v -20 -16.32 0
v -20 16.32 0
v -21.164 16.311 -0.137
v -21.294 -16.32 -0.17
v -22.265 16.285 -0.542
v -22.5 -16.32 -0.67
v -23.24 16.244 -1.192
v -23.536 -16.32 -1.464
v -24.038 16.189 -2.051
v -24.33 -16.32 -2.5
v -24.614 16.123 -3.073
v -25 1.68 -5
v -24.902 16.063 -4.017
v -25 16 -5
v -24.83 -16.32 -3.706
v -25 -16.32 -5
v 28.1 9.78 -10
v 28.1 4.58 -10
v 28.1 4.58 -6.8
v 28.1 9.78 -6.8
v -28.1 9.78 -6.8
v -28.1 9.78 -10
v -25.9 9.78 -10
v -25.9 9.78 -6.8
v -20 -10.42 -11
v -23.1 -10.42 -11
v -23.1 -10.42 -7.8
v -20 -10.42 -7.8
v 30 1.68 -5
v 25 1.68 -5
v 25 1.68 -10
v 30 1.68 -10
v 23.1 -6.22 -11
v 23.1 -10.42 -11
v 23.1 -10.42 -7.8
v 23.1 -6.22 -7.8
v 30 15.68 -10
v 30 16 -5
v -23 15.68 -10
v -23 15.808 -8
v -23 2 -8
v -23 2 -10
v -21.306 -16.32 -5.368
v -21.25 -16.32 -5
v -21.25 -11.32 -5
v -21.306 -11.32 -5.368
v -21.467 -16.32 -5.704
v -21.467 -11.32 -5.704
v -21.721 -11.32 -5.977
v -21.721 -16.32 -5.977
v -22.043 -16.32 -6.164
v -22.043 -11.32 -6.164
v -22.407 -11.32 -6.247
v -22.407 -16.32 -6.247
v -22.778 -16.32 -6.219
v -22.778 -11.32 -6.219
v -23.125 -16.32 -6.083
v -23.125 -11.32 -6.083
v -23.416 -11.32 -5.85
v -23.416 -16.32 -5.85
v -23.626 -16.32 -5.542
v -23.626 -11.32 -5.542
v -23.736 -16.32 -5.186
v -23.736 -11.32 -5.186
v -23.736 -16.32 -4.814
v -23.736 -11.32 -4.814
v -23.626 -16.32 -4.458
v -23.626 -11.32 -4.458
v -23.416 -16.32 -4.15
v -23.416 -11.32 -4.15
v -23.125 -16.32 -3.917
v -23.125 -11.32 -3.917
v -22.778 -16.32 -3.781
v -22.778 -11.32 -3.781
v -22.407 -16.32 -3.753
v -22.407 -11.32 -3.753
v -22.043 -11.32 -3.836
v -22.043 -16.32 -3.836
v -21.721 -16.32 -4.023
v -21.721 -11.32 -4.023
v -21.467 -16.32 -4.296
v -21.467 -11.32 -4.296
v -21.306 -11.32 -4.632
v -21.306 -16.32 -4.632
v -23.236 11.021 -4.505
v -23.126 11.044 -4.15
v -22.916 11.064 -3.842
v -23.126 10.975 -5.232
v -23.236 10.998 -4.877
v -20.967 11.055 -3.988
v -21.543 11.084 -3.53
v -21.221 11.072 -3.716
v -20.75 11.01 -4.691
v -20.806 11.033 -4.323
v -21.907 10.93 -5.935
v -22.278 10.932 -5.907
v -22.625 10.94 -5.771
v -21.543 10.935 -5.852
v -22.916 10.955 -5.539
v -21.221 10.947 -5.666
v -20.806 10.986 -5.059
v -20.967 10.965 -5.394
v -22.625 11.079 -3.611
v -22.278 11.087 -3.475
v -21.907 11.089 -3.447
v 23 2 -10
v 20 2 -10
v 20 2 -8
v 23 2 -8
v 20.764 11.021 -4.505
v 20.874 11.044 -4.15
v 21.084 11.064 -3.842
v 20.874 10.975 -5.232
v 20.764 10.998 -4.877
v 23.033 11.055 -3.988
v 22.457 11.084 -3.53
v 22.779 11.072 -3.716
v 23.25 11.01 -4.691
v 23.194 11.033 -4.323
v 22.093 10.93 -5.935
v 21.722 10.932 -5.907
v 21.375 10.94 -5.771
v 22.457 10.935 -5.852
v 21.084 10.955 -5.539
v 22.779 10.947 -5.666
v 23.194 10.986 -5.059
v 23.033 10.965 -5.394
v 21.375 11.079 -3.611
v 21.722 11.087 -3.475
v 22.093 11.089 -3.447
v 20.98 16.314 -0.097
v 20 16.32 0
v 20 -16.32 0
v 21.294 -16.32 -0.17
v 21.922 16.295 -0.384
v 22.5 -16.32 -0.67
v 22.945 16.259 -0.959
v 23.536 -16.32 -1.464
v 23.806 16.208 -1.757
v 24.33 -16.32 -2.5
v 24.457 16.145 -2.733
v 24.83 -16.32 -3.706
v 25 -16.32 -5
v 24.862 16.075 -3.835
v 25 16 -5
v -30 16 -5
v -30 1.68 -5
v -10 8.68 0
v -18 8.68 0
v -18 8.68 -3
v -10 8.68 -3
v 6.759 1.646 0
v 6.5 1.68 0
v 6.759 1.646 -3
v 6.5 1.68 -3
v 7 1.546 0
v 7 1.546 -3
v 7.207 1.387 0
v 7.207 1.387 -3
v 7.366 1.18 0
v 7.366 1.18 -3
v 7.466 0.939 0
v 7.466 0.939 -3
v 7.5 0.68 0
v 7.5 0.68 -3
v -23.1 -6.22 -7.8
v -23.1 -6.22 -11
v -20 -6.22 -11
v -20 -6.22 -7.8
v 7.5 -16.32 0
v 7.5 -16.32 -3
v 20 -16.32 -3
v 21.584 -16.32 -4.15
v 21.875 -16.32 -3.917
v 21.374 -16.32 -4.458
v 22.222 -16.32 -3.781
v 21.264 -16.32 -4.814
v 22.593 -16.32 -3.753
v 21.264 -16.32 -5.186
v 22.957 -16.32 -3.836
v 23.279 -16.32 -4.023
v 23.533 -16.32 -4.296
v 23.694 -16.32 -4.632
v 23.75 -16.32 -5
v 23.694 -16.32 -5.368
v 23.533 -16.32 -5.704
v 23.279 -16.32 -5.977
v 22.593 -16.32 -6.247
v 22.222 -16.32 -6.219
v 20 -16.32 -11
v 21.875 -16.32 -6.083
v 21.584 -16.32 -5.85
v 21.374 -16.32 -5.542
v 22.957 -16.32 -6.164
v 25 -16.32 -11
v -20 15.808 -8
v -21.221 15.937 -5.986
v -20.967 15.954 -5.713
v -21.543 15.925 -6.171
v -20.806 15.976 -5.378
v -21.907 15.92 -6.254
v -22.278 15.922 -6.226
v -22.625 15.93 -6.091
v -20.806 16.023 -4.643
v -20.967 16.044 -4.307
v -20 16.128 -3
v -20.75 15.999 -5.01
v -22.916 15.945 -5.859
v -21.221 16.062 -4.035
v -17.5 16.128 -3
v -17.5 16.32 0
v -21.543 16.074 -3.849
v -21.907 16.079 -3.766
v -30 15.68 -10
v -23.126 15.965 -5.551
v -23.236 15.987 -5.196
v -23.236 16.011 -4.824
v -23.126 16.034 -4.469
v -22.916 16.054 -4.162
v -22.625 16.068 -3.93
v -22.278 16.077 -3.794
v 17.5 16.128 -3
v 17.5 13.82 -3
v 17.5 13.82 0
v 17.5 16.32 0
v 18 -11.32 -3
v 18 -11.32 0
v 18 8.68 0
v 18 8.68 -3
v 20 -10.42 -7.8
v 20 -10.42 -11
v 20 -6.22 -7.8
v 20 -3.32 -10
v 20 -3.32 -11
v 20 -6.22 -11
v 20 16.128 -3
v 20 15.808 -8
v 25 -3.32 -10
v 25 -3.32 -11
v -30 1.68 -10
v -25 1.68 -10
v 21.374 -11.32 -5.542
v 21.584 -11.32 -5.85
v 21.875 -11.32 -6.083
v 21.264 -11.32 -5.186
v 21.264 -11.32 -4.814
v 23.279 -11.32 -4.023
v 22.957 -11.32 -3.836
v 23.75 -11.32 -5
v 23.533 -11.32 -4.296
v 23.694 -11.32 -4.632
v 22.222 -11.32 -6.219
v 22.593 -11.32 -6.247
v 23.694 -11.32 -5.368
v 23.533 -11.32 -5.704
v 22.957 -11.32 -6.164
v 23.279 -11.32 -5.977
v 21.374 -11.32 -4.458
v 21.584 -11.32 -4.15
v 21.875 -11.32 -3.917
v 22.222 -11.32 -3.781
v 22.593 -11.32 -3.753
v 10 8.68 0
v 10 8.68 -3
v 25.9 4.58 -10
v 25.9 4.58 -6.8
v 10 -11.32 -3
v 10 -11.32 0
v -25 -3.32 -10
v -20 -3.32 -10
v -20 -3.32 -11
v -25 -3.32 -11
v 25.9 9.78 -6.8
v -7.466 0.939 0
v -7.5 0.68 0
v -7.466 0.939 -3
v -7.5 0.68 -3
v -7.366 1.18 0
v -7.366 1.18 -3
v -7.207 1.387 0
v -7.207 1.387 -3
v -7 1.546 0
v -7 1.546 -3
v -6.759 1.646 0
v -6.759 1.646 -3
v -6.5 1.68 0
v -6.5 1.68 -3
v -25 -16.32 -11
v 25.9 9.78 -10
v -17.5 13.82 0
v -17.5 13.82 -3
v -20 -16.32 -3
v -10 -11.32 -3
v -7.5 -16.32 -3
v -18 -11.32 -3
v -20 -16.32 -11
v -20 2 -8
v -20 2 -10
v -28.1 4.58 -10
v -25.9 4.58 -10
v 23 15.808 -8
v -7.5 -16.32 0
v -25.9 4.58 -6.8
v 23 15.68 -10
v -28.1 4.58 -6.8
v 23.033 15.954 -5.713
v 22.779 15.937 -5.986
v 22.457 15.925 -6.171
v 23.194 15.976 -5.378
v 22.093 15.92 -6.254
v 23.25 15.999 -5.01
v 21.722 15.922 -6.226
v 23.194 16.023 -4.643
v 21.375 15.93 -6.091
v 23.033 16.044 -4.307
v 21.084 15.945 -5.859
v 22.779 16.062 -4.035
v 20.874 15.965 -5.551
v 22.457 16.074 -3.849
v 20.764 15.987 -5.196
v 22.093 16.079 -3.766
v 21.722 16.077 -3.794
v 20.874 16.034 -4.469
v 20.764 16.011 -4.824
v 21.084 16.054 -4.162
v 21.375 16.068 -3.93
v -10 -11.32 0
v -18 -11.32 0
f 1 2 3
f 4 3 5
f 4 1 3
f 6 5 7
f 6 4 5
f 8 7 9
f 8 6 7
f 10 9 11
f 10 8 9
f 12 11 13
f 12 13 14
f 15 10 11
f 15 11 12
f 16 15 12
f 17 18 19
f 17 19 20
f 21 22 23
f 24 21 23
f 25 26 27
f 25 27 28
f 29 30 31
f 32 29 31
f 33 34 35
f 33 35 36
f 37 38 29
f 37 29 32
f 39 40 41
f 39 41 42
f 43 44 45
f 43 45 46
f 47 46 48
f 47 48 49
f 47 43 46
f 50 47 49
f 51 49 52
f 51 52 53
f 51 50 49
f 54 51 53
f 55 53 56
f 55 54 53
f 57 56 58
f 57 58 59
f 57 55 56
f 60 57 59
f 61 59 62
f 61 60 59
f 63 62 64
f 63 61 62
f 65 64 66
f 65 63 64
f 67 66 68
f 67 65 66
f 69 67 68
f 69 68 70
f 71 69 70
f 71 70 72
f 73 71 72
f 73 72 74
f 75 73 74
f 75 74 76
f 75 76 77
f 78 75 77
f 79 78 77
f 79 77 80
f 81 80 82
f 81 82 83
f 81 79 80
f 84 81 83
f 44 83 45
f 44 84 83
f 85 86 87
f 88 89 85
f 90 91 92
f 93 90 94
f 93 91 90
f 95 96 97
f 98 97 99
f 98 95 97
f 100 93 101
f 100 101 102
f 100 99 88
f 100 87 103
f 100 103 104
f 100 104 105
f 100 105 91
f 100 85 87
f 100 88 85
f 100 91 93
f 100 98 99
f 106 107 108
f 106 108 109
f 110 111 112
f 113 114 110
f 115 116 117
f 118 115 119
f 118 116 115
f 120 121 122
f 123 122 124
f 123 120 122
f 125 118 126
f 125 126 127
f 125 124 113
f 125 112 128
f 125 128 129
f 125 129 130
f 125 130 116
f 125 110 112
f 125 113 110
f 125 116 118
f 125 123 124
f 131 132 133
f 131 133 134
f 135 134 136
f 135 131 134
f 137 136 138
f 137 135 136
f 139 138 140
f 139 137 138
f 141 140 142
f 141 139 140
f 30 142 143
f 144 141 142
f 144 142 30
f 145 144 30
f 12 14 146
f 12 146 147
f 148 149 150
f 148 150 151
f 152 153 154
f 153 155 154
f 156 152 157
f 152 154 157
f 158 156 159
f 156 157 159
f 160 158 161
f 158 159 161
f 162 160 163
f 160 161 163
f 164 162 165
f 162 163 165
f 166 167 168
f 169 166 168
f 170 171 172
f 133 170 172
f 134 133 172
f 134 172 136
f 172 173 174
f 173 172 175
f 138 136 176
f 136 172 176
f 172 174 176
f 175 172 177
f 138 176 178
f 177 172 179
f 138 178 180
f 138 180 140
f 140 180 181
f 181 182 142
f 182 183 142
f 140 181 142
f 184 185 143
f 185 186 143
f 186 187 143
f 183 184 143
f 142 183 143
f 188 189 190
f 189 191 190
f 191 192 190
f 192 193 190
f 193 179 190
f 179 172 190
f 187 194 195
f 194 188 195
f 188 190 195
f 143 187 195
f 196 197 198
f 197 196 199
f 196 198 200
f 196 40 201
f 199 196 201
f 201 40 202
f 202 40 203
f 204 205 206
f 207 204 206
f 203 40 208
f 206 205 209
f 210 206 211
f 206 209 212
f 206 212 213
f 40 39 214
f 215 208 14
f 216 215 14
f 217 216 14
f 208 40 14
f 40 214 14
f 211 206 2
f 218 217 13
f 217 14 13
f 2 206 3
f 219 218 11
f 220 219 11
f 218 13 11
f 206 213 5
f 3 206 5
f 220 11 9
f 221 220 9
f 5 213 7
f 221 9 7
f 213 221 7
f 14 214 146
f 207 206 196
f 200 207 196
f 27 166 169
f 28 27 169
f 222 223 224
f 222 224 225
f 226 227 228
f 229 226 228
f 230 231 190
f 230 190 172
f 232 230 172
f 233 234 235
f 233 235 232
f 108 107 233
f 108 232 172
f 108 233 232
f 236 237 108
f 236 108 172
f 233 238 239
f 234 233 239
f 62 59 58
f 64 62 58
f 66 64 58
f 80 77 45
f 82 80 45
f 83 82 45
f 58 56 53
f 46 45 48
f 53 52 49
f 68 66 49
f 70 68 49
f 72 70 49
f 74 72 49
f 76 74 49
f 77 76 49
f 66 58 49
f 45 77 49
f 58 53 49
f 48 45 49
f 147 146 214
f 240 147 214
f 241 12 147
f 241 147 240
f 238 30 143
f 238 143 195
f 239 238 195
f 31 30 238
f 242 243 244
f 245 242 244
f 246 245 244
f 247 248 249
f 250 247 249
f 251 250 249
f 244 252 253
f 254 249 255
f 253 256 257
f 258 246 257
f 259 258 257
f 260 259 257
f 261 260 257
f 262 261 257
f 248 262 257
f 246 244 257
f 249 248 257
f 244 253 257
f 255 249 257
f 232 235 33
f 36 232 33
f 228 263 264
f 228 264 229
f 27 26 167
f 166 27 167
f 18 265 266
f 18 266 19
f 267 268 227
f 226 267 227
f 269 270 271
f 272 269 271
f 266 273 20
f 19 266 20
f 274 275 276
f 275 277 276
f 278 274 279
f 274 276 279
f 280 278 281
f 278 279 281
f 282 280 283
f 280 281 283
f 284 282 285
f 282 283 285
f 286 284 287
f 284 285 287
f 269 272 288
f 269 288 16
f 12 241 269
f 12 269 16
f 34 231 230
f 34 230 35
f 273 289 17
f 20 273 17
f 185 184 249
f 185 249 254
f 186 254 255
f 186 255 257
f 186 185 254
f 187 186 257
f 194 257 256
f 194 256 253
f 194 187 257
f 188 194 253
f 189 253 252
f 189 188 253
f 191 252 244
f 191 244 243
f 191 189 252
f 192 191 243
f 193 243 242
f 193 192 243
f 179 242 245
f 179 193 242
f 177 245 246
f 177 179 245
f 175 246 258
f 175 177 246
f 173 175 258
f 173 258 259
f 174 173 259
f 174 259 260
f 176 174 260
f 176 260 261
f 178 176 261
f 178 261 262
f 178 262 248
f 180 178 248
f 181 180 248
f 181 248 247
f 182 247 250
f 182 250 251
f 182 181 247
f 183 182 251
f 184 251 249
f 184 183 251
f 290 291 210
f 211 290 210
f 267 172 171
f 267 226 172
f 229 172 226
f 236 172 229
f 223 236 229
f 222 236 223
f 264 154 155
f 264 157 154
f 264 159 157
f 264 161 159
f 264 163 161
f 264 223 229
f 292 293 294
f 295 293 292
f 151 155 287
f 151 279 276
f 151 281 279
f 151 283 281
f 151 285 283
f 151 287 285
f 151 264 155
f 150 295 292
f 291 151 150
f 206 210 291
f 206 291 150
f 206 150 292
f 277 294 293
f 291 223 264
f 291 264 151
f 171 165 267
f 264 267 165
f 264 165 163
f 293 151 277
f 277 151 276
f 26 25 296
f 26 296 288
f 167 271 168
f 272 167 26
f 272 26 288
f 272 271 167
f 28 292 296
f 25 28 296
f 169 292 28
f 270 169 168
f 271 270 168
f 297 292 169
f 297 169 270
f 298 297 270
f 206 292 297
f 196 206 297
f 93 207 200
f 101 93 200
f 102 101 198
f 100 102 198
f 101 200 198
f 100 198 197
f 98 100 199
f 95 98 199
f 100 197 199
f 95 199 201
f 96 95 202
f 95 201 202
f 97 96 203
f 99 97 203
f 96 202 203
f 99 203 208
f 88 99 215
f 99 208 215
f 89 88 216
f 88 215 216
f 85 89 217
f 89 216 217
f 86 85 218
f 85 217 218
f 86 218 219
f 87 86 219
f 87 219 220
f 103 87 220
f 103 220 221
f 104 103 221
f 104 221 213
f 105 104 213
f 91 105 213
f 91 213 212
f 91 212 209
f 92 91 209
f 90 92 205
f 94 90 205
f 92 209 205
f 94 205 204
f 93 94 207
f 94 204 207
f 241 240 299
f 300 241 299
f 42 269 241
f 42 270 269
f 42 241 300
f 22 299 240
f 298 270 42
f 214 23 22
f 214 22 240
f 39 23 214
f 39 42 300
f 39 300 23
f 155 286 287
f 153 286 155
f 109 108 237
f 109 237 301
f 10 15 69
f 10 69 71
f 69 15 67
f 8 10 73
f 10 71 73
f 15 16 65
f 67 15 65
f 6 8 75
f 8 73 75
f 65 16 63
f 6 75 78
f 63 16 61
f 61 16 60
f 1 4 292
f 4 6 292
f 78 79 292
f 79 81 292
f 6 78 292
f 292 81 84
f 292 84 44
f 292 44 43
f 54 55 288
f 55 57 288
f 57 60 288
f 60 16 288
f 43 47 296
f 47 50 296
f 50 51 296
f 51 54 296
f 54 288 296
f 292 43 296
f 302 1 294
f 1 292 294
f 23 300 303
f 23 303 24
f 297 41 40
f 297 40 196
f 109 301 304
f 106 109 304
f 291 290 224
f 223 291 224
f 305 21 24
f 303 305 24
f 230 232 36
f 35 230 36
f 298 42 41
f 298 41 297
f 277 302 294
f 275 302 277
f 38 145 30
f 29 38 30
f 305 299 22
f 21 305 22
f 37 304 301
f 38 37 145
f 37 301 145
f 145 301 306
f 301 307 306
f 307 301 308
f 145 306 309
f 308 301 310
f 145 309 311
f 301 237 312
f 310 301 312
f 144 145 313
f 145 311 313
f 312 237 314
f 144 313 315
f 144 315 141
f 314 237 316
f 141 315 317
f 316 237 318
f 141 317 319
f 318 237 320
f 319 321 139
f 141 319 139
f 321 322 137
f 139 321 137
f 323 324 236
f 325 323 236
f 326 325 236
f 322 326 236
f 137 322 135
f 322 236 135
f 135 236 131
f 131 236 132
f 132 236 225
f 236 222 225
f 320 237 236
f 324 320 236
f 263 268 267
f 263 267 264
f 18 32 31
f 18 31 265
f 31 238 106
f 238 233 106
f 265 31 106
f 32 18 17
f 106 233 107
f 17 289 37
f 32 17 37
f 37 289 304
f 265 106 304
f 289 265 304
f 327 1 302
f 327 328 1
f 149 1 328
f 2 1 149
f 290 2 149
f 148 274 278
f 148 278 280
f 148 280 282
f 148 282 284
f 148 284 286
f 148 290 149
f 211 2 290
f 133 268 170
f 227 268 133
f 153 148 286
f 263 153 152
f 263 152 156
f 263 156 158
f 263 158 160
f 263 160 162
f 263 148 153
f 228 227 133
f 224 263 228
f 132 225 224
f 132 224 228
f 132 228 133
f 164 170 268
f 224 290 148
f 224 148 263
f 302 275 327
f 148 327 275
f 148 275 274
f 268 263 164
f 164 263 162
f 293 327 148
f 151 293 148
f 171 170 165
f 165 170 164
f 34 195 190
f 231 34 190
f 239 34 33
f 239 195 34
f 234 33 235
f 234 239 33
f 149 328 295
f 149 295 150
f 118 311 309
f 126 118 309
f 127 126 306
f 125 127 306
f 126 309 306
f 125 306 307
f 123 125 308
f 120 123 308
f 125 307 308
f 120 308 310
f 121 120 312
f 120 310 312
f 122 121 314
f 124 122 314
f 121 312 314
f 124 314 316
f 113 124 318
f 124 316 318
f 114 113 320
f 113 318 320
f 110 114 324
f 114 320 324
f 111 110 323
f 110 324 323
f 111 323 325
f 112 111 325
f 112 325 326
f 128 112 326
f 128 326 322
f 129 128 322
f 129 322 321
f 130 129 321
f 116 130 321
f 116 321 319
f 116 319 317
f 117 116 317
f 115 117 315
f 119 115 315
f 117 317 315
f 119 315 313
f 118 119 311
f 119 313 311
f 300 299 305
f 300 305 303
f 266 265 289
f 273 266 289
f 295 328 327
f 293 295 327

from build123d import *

# Parameters (mm, degrees)
BOSS_EXTRUDE1_DEPTH = 16.32
SKETCH3_W           = 8
SKETCH3_H           = 20
SKETCH3_W_2         = 15
SKETCH3_H_2         = 18
CUT_EXTRUDE1_DEPTH  = 4
SKETCH4_W           = 1
SKETCH4_H           = 19.64
CUT_EXTRUDE2_DEPTH  = 27.5
FILLET1_R           = 5
CUT_EXTRUDE3_DEPTH  = 26
BOSS_EXTRUDE2_START = -25
BOSS_EXTRUDE2_DEPTH = 5
BOSS_EXTRUDE3_START = 25
BOSS_EXTRUDE3_DEPTH = 5
SKETCH7_R           = 1.25
CUT_EXTRUDE4_DEPTH  = 5
SKETCH8_W           = 35
SKETCH8_H           = 5
CUT_EXTRUDE5_DEPTH  = 5
CUT_EXTRUDE6_START  = -10
SKETCH9_W           = 2.2
SKETCH9_H           = 5.2
CUT_EXTRUDE6_DEPTH  = 3.2
CUT_EXTRUDE7_START  = -16.32
SKETCH10_R          = 1.25
CUT_EXTRUDE7_DEPTH  = 5
CUT_EXTRUDE8_START  = -11
SKETCH11_W          = 3.2
SKETCH11_H          = 4.2
CUT_EXTRUDE8_DEPTH  = 3.2
CUT_EXTRUDE9_START  = 2
SKETCH12_W          = 3
SKETCH12_H          = 2
CUT_EXTRUDE9_DEPTH  = 15
FILLET3_R           = 1


with BuildPart() as part:
    # Sketch2 → Boss-Extrude1 (new body, symmetric)
    with BuildSketch(Plane(origin=(0, 0, 0), x_dir=(1, 0, 0), z_dir=(0, 1, 0))):
        Polygon((-25, 0), (25, 0), (25, 11), (20, 11), (20, 3), (-20, 3), (-20, 11), (-25, 11), align=None)
    extrude(amount=BOSS_EXTRUDE1_DEPTH, both=True)

    # Sketch3 → Cut-Extrude1 (cut)
    with BuildSketch(Plane.XY):
        with Locations((14, -1.32)):
            Rectangle(SKETCH3_W, SKETCH3_H)
        with Locations((-14, -1.32)):
            Rectangle(SKETCH3_W, SKETCH3_H)
        with Locations((0, -7.32)):
            Rectangle(SKETCH3_W_2, SKETCH3_H_2)
    extrude(amount=-CUT_EXTRUDE1_DEPTH, mode=Mode.SUBTRACT)

    # Sketch4 → Cut-Extrude2 (cut, symmetric)
    with BuildSketch(Plane(origin=(0, 0, 0), x_dir=(0, 0, -1), z_dir=(1, 0, 0))):
        with Locations((10.5, 6.5)):
            Rectangle(SKETCH4_W, SKETCH4_H)
    extrude(amount=CUT_EXTRUDE2_DEPTH, both=True, mode=Mode.SUBTRACT)

    # Fillet1
    fillet1_edges = [part.edges().sort_by_distance(p)[0] for p in [
        (25, 0, 0),
        (-25, 0, 0),
    ]]
    fillet(fillet1_edges, radius=FILLET1_R)

    # Sketch5 → Cut-Extrude3 (cut, symmetric)
    with BuildSketch(Plane(origin=(0, 0, 0), x_dir=(0, 0, -1), z_dir=(1, 0, 0))):
        Polygon((10, 16.32), (0, 16.32), (10, 15.68), align=None)
    extrude(amount=CUT_EXTRUDE3_DEPTH, both=True, mode=Mode.SUBTRACT)

    # Sketch6 → Boss-Extrude2 (add)
    with BuildSketch(Plane(origin=(0, 0, 0), x_dir=(0, 0, -1), z_dir=(1, 0, 0)).offset(BOSS_EXTRUDE2_START)):
        Polygon((10, 15.68), (5, 16), (5, 1.68), (10, 1.68), align=None)
    extrude(amount=-BOSS_EXTRUDE2_DEPTH)

    # Sketch6<2> → Boss-Extrude3 (add)
    with BuildSketch(Plane(origin=(0, 0, 0), x_dir=(0, 0, -1), z_dir=(1, 0, 0)).offset(BOSS_EXTRUDE3_START)):
        Polygon((10, 15.68), (5, 16), (5, 1.68), (10, 1.68), align=None)
    extrude(amount=BOSS_EXTRUDE3_DEPTH)

    # Sketch7 → Cut-Extrude4 (cut)
    with BuildSketch(Plane(origin=(0, 16.253425967, -1.040219262), x_dir=(1, 0, 0), z_dir=(0, 0.99795827, -0.063869329))):
        with Locations((22, 3.978111617)):
            Circle(SKETCH7_R)
        with Locations((-22, 3.978111617)):
            Circle(SKETCH7_R)
    extrude(amount=-CUT_EXTRUDE4_DEPTH, mode=Mode.SUBTRACT)

    # Sketch8 → Cut-Extrude5 (cut)
    with BuildSketch(Plane.XY):
        with Locations((0, 16.32)):
            Rectangle(SKETCH8_W, SKETCH8_H)
    extrude(amount=-CUT_EXTRUDE5_DEPTH, mode=Mode.SUBTRACT)

    # Sketch9 → Cut-Extrude6 (cut)
    with BuildSketch(Plane.XY.offset(CUT_EXTRUDE6_START)):
        with Locations((-27, 7.18)):
            Rectangle(SKETCH9_W, SKETCH9_H)
        with Locations((27, 7.18)):
            Rectangle(SKETCH9_W, SKETCH9_H)
    extrude(amount=CUT_EXTRUDE6_DEPTH, mode=Mode.SUBTRACT)

    # Sketch10 → Cut-Extrude7 (cut)
    with BuildSketch(Plane(origin=(0, 0, 0), x_dir=(1, 0, 0), z_dir=(0, 1, 0)).offset(CUT_EXTRUDE7_START)):
        with Locations((-22.5, 5)):
            Circle(SKETCH10_R)
        with Locations((22.5, 5)):
            Circle(SKETCH10_R)
    extrude(amount=CUT_EXTRUDE7_DEPTH, mode=Mode.SUBTRACT)

    # Sketch11 → Cut-Extrude8 (cut)
    with BuildSketch(Plane.XY.offset(CUT_EXTRUDE8_START)):
        with Locations((21.5, -8.32)):
            Rectangle(SKETCH11_W, SKETCH11_H)
        with Locations((-21.5, -8.32)):
            Rectangle(SKETCH11_W, SKETCH11_H)
    extrude(amount=CUT_EXTRUDE8_DEPTH, mode=Mode.SUBTRACT)

    # Sketch12 → Cut-Extrude9 (cut)
    with BuildSketch(Plane(origin=(0, 0, 0), x_dir=(1, 0, 0), z_dir=(0, 1, 0)).offset(CUT_EXTRUDE9_START)):
        with Locations((21.5, 9)):
            Rectangle(SKETCH12_W, SKETCH12_H)
        with Locations((-21.5, 9)):
            Rectangle(SKETCH12_W, SKETCH12_H)
    extrude(amount=CUT_EXTRUDE9_DEPTH, mode=Mode.SUBTRACT)

    # Fillet3
    fillet3_edges = [part.edges().sort_by_distance(p)[0] for p in [
        (-7.5, 1.68, -1.5),
        (7.5, 1.68, -1.5),
    ]]
    fillet(fillet3_edges, radius=FILLET3_R)


solid = part.part
